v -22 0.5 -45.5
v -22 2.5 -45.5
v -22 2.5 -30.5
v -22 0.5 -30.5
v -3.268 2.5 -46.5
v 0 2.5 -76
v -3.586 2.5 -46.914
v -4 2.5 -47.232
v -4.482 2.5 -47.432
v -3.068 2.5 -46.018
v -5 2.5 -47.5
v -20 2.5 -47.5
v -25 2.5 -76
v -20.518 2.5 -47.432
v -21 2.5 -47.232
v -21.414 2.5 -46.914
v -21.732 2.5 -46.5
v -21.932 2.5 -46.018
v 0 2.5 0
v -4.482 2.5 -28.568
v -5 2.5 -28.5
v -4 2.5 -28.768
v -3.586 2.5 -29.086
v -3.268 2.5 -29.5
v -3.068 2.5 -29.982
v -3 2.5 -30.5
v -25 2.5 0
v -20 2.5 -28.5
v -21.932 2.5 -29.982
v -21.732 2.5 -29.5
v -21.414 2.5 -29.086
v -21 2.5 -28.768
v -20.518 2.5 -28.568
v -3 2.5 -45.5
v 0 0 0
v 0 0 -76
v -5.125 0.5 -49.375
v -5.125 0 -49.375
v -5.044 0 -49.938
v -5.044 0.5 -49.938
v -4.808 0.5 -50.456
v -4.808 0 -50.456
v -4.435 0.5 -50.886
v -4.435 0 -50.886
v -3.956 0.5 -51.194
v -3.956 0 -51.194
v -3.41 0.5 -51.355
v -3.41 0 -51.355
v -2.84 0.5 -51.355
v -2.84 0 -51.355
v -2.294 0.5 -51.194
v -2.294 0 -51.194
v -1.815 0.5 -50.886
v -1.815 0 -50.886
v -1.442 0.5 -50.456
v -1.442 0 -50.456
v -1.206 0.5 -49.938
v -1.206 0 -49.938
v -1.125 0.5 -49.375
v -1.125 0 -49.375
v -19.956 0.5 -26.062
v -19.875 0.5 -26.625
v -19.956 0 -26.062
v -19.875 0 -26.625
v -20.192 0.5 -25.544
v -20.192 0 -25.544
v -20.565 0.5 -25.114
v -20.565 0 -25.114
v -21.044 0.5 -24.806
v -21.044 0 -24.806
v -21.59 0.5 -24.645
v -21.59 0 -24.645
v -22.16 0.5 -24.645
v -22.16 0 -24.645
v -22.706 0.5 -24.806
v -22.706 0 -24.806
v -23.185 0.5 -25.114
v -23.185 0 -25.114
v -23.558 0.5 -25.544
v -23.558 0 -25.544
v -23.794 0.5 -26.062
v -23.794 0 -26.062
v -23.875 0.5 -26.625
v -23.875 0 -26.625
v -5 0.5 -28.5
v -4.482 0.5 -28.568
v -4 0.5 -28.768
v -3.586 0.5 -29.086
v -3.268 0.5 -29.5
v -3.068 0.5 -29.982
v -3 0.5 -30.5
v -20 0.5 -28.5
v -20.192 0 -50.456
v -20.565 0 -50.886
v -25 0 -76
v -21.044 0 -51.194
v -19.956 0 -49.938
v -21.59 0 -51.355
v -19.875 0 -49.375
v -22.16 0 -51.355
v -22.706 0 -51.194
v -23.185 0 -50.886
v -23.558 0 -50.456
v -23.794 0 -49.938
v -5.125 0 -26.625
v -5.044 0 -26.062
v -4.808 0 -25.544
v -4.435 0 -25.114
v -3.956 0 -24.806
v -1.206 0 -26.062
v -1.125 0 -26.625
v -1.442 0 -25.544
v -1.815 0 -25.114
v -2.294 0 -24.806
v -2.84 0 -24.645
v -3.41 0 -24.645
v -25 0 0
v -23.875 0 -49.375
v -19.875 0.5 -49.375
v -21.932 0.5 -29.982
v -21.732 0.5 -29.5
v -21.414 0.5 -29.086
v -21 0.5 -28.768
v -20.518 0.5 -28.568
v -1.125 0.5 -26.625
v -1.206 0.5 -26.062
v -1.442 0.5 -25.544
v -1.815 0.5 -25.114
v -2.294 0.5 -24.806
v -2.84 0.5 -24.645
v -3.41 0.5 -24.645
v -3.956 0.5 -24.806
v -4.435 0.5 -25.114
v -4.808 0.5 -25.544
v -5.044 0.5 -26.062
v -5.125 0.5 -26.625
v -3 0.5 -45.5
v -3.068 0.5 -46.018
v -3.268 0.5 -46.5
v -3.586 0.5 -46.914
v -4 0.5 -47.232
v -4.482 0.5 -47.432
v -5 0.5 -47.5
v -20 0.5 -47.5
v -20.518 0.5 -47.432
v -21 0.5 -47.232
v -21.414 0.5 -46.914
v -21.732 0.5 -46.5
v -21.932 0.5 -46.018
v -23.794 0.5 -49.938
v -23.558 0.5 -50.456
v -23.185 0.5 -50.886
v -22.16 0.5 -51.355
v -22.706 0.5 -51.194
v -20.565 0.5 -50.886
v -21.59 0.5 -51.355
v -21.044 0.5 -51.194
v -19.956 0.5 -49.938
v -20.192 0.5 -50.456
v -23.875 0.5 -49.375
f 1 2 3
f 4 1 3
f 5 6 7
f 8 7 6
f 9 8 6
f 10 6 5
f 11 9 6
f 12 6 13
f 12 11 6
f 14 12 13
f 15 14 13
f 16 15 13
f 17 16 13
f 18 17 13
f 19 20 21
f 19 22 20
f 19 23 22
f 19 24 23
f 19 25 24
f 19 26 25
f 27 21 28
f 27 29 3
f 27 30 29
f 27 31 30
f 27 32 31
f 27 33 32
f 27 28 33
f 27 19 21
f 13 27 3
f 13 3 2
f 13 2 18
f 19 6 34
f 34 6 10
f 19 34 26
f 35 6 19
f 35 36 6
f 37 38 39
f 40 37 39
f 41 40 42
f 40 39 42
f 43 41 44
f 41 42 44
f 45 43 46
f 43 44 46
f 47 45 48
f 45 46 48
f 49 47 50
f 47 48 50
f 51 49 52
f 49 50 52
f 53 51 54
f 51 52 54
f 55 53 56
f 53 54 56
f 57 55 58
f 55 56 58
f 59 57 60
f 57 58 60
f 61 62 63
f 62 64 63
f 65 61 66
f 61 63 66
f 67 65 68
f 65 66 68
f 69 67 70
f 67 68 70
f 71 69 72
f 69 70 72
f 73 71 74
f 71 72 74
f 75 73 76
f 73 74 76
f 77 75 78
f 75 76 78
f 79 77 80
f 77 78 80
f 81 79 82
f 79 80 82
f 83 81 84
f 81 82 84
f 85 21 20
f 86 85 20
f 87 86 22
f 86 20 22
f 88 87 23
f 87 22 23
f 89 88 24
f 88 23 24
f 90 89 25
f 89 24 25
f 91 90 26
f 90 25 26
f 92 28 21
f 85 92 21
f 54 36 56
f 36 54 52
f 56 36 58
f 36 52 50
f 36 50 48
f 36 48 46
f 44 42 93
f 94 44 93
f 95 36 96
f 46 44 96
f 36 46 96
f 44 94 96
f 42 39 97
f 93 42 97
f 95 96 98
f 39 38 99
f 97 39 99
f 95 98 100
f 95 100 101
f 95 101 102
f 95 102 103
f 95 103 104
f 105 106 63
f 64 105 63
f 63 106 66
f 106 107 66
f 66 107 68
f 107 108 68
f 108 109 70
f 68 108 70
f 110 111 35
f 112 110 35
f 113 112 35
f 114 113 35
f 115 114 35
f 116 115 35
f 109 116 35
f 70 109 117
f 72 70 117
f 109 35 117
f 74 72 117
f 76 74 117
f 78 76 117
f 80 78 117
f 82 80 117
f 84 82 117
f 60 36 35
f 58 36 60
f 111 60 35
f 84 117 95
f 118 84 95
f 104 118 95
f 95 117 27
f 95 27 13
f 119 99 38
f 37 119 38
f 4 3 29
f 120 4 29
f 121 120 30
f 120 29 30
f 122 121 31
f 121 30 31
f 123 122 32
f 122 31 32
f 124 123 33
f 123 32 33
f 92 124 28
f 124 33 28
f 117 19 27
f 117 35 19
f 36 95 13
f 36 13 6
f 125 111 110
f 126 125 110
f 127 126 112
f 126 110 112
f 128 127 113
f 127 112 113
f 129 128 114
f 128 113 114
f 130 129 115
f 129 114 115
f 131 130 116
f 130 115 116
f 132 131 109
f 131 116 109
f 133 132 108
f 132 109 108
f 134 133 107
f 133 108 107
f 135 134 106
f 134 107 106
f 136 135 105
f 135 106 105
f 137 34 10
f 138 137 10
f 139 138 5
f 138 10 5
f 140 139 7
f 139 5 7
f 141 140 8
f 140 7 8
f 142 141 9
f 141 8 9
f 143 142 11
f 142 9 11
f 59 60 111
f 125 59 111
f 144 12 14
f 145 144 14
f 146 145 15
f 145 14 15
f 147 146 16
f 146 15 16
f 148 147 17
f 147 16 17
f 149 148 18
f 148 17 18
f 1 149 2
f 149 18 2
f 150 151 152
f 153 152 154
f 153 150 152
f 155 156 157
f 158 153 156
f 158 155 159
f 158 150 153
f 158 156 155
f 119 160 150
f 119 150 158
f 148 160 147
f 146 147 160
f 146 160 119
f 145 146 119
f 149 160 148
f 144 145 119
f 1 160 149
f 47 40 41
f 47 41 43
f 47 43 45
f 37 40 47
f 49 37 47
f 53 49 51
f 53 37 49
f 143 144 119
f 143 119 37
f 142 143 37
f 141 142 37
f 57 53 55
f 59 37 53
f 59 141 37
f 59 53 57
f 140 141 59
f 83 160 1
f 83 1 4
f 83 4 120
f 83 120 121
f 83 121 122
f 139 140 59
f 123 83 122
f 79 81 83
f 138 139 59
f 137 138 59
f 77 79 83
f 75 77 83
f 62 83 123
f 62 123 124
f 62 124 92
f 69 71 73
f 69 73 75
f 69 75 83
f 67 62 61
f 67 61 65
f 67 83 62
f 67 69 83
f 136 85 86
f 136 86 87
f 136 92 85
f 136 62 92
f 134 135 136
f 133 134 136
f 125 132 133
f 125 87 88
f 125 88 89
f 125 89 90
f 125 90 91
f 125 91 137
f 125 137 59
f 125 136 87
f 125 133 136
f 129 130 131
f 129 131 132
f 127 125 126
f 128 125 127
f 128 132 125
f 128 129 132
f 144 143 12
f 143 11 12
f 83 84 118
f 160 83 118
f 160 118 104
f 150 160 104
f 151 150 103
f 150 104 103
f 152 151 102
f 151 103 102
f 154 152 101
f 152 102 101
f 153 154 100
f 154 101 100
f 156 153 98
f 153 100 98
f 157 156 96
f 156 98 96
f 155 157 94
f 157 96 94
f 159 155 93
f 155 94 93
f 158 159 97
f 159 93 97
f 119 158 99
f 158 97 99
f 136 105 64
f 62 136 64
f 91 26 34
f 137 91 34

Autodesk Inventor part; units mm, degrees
ref_plane "YZ Plane" through (0, 0, 0) normal (1, 0, 0) x (0, 1, 0)
ref_plane "XZ Plane" through (0, 0, 0) normal (0, 1, 0) x (-1, 0, 0)
ref_plane "XY Plane" through (0, 0, 0) normal (0, 0, 1) x (1, 0, 0)
sketch "Sketch1" plane through (0, 0, 0) normal (0, 1, 0) x (-1, 0, 0)
  line L0 (0, 0) -> (25, 0)
  line L1 (25, 0) -> (25, -76)
  line L2 (25, -76) -> (0, -76)
  line L3 (0, -76) -> (0, 0)
  dimension "d0" = 76
  dimension "d1" = 25
extrude "Extrusion1" add sketch "Sketch1" along normal blind 2.5
ref_plane "Work Plane2" through (0, 5.5, 0) normal (0, 1, 0) x (1, 0, 0)
sketch "Sketch3" plane through (0, 5.5, 0) normal (0, 1, 0) x (1, 0, 0)
  line L0 (0, 0) -> (-25, 0) construction
  line L1 (-12.5, 0) -> (-12.5, 76) construction
  line L2 (-25, 76) -> (0, 76) construction
  line L3 (-25, 71) -> (-25, 5) construction
  line L4 (-25, 38) -> (-0.4405, 38) construction
  line L5 (-20, 28.5) -> (-5, 28.5)
  line L6 (-3, 30.5) -> (-3, 45.5)
  line L7 (-5, 47.5) -> (-20, 47.5)
  line L8 (-22, 45.5) -> (-22, 30.5)
  line L9 (-22, 28.5) -> (-3, 47.5) construction
  line L10 (-3, 28.5) -> (-22, 47.5) construction
  arc A0 (-20, 47.5) -> (-22, 45.5) centre (-20, 45.5) ccw
  arc A1 (-3, 45.5) -> (-5, 47.5) centre (-5, 45.5) ccw
  arc A2 (-5, 28.5) -> (-3, 30.5) centre (-5, 30.5) ccw
  arc A3 (-22, 30.5) -> (-20, 28.5) centre (-20, 30.5) ccw
  point P0 (-12.5, 38)
  dimension "d8" = 19
  dimension "d9" = 2
  dimension "d10" = 2
  dimension "d11" = 2
  dimension "d12" = 2
extrude "Extrusion3" cut sketch "Sketch3" against normal blind 6
sketch "Sketch4" plane through (0, 0, 0) normal (0, -1, 0) x (1, 0, 0)
  line L0 (0, -76) -> (0, 0) construction
  line L1 (0, -38) -> (-25, -38) construction
  line L2 (-25, -71) -> (-25, -5) construction
  line L3 (0, 0) -> (-25, 0) construction
  line L4 (-12.5, 0) -> (-12.5, -76) construction
  line L5 (-25, -76) -> (0, -76) construction
  line L6 (-19.875, -49.375) -> (-5.125, -49.375)
  line L7 (-1.125, -49.375) -> (-1.125, -26.625)
  line L8 (-5.125, -26.625) -> (-19.875, -26.625)
  line L9 (-23.875, -26.625) -> (-23.875, -49.375)
  line L10 (-23.875, -49.375) -> (-1.125, -26.625) construction
  line L11 (-1.125, -49.375) -> (-23.875, -26.625) construction
  arc A0 (-1.125, -26.625) -> (-5.125, -26.625) centre (-3.125, -26.625) ccw
  arc A1 (-19.875, -26.625) -> (-23.875, -26.625) centre (-21.875, -26.625) ccw
  arc A2 (-23.875, -49.375) -> (-19.875, -49.375) centre (-21.875, -49.375) ccw
  arc A3 (-5.125, -49.375) -> (-1.125, -49.375) centre (-3.125, -49.375) ccw
  point P0 (-12.5, -38)
  dimension "d15" = 22.75
  dimension "d16" = 4
  dimension "d17" = 22.75
extrude "Extrusion4" cut sketch "Sketch4" against normal blind 0.5
sketch "Sketch5" plane through (0, 0, 0) normal (0, -1, 0) x (1, 0, 0)
  circle A0 centre (-12.5, -19.3349) radius 2.5305
  circle A1 centre (-12.5, -56) radius 2.6164
  line L0 (0, -76) -> (0, 0) projected
  line L1 (-25, -76) -> (0, -76) projected
  dimension "d20" = 12.5
  dimension "d21" = 20
properties part number "scope coverslip holder lowpro"
